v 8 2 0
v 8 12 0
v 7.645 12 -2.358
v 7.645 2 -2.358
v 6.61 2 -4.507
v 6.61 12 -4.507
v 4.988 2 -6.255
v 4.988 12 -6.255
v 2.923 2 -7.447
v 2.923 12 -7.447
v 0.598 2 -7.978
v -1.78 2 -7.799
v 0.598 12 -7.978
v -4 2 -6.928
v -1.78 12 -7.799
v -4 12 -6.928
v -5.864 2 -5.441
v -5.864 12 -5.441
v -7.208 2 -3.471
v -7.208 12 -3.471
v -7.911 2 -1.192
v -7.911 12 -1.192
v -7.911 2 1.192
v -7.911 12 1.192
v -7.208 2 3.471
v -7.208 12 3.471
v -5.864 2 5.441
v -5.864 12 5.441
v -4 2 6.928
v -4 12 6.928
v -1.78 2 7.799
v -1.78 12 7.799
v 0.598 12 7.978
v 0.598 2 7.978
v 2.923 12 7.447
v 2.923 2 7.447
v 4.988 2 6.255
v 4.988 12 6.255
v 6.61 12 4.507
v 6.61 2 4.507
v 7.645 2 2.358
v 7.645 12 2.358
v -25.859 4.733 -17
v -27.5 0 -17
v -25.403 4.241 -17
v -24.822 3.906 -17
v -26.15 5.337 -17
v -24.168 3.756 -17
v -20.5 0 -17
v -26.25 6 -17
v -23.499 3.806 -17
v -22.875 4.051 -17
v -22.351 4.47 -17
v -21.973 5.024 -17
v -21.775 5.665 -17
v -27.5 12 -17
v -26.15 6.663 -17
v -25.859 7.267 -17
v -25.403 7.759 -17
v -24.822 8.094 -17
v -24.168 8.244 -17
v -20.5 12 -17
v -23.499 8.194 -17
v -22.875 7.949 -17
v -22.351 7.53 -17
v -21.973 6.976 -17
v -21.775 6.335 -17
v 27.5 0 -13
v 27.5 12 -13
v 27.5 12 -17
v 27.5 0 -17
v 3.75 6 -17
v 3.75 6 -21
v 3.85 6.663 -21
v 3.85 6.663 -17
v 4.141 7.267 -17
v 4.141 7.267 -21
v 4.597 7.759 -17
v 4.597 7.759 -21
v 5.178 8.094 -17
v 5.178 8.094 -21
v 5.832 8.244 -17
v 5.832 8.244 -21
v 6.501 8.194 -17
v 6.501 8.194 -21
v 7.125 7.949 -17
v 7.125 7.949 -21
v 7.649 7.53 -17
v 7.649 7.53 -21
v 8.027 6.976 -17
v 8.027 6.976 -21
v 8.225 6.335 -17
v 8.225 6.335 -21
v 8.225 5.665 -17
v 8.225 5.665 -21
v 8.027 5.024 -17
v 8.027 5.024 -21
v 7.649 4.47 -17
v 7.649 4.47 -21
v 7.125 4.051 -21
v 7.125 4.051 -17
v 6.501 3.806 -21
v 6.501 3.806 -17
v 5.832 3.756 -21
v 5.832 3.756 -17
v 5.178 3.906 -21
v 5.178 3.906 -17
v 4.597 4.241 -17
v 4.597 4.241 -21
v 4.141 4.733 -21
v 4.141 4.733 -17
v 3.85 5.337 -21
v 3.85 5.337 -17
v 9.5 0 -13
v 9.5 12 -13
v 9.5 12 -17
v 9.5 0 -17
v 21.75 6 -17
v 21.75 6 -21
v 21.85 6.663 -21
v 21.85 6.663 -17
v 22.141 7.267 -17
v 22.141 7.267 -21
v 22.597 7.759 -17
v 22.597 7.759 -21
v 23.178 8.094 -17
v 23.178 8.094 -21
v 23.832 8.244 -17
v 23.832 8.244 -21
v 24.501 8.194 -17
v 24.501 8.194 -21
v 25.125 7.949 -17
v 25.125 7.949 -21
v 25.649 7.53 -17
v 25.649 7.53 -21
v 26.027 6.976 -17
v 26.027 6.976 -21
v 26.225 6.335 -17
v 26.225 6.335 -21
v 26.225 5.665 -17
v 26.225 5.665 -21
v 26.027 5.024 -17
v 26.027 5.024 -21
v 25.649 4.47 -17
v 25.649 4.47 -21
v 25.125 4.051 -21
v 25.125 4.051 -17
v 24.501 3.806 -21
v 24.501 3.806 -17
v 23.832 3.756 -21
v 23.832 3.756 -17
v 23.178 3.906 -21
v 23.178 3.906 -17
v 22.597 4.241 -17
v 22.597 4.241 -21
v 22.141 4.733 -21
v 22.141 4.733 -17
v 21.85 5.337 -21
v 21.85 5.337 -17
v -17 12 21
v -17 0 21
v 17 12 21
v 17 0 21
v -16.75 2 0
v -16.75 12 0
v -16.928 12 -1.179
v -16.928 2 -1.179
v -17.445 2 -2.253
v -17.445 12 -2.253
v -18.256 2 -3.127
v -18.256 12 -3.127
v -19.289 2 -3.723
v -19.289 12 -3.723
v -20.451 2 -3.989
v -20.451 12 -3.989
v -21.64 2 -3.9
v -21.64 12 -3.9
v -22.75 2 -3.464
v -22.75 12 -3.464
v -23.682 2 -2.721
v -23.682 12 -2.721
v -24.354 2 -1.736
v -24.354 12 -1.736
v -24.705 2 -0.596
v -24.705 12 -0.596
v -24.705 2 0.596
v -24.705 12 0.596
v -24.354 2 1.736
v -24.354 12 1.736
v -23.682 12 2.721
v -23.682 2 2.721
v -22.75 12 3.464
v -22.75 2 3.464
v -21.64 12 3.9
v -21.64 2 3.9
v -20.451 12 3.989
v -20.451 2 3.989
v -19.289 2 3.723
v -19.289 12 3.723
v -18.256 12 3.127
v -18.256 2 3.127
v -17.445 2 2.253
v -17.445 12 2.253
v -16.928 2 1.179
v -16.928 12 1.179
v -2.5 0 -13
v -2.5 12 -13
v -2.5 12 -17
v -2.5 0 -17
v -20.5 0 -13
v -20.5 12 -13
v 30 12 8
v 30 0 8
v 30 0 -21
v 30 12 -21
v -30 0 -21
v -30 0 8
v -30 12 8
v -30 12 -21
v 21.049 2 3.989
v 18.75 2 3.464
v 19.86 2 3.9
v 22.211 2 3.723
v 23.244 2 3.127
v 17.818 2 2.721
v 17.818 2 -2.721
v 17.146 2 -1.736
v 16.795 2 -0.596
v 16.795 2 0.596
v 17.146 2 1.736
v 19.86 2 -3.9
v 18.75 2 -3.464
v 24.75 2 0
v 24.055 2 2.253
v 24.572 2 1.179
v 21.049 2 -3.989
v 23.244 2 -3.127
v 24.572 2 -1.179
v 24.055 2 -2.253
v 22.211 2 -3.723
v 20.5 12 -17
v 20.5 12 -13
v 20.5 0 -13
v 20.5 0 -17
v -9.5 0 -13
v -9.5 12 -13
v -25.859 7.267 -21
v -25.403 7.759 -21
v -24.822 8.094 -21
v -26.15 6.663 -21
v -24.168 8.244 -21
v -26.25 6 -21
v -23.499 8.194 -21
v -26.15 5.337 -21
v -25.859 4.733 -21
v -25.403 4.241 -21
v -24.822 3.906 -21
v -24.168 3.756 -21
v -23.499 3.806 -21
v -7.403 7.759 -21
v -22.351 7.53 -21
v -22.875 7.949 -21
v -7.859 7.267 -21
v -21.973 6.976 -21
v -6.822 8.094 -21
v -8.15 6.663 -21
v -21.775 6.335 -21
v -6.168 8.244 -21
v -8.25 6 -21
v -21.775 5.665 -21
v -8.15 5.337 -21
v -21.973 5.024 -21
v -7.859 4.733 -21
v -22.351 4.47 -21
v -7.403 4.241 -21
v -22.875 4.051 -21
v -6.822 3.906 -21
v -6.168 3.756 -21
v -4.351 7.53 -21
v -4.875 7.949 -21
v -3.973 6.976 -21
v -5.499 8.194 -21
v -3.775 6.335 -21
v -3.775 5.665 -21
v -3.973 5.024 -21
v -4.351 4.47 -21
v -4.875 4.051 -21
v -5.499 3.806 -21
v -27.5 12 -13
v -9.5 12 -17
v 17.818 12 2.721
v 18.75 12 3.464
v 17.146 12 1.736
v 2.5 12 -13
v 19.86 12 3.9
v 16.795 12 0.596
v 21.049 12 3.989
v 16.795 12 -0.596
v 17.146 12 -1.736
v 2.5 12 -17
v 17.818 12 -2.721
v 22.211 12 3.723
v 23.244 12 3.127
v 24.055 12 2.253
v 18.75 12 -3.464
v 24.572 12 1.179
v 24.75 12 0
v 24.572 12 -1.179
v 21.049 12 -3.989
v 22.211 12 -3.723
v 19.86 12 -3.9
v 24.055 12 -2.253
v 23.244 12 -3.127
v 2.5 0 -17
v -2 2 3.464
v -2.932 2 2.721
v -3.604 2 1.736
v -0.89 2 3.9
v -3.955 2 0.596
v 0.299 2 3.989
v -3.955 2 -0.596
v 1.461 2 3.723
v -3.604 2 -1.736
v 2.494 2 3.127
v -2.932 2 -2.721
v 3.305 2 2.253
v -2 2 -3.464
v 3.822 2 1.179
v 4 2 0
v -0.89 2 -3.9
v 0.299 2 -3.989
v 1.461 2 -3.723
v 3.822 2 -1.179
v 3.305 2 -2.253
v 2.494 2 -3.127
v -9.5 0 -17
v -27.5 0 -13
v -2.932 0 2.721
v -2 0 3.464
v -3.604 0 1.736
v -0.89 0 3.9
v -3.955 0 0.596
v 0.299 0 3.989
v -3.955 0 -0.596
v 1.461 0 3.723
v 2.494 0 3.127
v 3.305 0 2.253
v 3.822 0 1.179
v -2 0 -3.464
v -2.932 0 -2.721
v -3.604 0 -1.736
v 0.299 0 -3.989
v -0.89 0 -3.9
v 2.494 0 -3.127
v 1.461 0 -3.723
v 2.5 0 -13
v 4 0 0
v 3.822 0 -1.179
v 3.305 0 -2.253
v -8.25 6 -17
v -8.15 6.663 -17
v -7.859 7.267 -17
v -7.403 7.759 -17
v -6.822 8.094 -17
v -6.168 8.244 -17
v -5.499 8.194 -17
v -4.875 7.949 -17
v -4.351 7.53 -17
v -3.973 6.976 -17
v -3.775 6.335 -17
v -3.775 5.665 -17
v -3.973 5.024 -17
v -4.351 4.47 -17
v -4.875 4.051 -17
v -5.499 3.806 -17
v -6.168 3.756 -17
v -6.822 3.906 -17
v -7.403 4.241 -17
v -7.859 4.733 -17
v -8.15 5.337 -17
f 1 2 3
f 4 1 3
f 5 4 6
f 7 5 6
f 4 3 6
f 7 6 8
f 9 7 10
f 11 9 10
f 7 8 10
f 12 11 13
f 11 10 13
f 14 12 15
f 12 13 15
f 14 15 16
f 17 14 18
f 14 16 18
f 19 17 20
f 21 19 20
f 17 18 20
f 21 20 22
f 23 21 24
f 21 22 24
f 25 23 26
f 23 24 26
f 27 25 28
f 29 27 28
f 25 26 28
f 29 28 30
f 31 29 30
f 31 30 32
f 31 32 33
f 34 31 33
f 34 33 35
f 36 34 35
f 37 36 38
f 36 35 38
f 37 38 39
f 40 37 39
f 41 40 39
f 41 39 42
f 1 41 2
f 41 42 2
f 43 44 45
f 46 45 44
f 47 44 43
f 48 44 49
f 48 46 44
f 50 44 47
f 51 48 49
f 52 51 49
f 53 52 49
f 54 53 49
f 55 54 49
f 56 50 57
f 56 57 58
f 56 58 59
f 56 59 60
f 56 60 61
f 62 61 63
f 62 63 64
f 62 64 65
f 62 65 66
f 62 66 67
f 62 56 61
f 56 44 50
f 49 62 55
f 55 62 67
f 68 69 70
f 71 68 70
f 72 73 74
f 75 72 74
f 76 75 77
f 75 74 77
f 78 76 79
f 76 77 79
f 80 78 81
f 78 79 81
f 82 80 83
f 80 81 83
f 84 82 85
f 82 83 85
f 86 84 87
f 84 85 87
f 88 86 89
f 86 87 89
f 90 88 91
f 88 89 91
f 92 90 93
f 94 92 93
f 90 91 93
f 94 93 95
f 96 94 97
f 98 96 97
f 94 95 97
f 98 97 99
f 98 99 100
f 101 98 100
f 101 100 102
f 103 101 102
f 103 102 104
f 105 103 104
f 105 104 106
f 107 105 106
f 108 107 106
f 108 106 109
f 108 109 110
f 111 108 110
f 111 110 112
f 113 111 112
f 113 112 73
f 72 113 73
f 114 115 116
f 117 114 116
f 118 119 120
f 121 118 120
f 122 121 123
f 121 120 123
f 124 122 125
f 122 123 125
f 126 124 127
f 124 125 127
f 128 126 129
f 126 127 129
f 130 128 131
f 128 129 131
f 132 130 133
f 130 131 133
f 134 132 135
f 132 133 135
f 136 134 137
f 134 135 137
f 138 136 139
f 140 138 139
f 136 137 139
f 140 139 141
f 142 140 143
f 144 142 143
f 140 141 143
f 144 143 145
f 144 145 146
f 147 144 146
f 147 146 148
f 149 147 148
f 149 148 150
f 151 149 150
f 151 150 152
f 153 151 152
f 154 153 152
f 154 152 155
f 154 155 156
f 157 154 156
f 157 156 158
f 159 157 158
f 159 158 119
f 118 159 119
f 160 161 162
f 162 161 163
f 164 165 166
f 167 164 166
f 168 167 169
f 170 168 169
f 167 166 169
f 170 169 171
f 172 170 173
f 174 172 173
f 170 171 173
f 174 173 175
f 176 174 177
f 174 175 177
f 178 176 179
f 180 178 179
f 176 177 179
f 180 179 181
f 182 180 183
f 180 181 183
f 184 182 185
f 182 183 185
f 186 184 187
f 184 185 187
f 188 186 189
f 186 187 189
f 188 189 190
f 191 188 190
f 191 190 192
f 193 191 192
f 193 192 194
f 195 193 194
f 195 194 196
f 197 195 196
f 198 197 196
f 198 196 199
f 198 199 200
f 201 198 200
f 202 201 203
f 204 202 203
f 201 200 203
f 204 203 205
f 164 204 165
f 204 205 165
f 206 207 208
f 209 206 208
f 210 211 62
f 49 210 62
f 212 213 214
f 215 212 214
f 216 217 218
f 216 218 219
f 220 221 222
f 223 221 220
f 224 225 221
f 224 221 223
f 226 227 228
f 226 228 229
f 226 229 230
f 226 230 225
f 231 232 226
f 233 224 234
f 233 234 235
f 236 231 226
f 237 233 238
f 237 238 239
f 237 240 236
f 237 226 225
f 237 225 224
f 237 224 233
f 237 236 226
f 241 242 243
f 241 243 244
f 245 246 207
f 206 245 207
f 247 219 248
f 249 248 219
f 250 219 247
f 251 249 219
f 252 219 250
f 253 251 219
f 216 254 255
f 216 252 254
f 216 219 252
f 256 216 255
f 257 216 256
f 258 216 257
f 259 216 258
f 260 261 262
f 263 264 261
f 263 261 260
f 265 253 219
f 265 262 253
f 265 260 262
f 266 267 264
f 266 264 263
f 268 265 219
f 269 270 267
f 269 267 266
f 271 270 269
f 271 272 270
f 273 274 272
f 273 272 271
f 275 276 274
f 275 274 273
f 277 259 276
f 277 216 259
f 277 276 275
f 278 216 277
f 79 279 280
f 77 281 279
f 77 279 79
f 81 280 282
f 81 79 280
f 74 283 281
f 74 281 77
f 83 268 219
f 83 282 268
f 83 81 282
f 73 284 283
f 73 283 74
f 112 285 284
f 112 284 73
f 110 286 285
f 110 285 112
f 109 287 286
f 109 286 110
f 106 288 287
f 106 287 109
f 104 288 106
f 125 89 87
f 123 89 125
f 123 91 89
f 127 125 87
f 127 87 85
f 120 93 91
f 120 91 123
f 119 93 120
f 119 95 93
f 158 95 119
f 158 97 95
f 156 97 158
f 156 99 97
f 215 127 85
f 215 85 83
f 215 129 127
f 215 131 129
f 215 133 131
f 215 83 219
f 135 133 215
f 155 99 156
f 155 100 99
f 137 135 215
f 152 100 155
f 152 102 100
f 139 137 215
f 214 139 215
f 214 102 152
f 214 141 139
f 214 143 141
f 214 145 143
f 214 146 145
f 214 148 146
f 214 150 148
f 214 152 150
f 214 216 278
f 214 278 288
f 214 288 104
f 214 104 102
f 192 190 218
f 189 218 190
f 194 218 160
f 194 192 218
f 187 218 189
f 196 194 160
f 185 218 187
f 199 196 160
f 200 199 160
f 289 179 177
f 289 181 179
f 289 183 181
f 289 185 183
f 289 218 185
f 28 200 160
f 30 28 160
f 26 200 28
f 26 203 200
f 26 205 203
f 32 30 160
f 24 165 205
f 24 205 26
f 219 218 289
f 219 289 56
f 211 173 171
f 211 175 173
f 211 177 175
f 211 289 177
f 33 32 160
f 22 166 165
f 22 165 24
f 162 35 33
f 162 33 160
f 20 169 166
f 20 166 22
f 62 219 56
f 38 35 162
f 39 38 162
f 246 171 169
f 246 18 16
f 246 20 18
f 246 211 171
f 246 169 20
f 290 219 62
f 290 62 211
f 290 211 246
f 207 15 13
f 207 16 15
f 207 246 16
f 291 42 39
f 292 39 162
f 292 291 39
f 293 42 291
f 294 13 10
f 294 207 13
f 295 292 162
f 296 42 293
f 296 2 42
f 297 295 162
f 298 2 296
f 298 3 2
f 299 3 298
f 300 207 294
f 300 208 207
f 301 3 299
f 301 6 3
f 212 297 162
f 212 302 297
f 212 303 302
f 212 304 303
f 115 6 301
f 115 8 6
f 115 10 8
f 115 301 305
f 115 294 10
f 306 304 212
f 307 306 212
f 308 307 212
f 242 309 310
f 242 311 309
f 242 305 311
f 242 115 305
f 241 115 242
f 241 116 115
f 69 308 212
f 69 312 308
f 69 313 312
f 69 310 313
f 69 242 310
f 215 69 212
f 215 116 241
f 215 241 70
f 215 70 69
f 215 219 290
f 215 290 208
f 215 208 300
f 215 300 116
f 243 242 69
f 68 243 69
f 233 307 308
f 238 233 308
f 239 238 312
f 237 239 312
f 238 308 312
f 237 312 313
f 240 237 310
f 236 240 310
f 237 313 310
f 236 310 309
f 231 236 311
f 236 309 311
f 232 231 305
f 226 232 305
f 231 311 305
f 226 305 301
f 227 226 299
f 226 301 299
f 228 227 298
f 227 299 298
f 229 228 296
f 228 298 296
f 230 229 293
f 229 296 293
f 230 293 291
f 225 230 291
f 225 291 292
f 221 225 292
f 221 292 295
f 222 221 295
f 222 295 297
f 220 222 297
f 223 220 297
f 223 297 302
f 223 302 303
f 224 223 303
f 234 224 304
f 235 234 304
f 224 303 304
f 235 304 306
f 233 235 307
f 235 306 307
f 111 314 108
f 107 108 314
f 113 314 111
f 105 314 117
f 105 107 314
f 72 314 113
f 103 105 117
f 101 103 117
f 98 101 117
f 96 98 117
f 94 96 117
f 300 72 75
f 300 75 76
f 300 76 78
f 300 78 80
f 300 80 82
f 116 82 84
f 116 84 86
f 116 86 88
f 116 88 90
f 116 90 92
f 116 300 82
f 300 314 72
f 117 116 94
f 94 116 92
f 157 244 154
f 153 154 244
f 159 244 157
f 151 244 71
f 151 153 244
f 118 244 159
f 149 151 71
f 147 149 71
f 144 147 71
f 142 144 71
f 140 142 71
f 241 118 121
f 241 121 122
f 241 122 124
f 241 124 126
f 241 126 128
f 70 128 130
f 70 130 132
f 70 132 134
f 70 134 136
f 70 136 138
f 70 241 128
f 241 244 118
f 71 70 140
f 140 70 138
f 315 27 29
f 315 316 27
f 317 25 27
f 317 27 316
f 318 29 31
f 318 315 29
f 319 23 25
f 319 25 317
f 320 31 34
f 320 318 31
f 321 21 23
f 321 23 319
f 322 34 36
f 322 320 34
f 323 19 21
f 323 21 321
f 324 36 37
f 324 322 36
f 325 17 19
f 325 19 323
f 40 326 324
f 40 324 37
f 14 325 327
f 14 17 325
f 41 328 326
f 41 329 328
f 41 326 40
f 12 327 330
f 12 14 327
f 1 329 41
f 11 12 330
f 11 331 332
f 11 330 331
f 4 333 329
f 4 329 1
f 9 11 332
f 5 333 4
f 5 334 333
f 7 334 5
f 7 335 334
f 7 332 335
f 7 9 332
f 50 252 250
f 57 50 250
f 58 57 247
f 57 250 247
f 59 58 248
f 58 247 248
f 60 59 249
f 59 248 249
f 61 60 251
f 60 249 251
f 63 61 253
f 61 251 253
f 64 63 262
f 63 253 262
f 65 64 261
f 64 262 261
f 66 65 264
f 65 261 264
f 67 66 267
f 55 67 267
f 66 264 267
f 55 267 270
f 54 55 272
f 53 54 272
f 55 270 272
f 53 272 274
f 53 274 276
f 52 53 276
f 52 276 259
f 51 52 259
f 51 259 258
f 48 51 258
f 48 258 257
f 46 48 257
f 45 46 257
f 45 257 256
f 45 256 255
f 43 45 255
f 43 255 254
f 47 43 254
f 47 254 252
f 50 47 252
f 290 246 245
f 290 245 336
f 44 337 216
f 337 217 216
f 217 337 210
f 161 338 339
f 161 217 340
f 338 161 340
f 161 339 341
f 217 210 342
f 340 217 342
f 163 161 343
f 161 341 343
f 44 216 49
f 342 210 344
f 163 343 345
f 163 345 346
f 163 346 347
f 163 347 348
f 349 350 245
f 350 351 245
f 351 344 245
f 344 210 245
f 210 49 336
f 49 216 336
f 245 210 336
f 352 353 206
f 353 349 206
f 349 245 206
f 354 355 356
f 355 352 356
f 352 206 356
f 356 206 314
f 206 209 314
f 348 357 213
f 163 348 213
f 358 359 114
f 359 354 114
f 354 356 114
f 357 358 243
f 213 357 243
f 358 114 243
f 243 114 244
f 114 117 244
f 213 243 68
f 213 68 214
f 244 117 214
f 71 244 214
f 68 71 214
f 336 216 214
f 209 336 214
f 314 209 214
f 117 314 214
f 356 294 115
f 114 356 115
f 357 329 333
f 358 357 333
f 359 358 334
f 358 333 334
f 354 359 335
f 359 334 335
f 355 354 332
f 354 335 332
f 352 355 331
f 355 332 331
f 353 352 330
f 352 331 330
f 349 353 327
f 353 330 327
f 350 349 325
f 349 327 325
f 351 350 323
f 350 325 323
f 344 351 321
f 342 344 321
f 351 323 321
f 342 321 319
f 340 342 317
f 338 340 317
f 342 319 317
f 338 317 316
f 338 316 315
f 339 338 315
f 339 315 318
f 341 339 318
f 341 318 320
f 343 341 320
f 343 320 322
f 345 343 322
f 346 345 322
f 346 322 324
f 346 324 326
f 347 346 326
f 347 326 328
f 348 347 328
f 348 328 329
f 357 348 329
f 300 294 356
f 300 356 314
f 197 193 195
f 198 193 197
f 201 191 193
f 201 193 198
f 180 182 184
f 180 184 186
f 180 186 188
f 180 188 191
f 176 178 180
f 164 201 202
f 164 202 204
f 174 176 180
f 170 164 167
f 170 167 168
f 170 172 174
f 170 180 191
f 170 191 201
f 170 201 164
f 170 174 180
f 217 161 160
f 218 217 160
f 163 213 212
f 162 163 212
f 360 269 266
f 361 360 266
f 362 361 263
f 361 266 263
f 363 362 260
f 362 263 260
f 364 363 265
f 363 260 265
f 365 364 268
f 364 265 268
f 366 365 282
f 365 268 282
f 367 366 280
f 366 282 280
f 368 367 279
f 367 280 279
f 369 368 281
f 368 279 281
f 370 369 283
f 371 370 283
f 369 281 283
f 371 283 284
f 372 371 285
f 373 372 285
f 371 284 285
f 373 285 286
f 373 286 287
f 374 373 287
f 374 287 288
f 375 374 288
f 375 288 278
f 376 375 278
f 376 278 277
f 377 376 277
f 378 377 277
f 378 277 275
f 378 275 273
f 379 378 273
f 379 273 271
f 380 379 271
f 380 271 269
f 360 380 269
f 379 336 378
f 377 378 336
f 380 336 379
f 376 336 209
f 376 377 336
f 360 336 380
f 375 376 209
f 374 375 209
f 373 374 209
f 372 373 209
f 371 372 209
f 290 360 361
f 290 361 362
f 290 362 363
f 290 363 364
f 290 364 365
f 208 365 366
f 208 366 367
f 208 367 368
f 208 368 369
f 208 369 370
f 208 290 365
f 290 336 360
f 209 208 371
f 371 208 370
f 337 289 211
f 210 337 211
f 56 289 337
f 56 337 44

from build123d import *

# Parameters (mm, degrees)
SKETCH1_W                      = 60
SKETCH1_H                      = 42
BOSS_EXTRUDE1_DEPTH            = 12
CUT_EXTRUDE1_REACH             = 14
SKETCH2_R                      = 4
CUT_EXTRUDE1_DIRECTION_2_DEPTH = 1
SKETCH3_R                      = 8
SKETCH3_R_2                    = 4
CUT_EXTRUDE2_DEPTH             = 1
CUT_EXTRUDE2_DEPTH_BACK        = 10
CHAMFER1_SIZE                  = 13
CUT_EXTRUDE4_REACH             = 14
SKETCH5_W                      = 7
SKETCH5_H                      = 4
CUT_EXTRUDE4_DIRECTION_2_DEPTH = 1
SKETCH4_R                      = 2.25
CUT_EXTRUDE3_DEPTH             = 7.5


with BuildPart() as part:
    # Sketch1 → Boss-Extrude1 (new body)
    with BuildSketch(Plane(origin=(0, 0, 0), x_dir=(1, 0, 0), z_dir=(0, 1, 0))):
        Rectangle(SKETCH1_W, SKETCH1_H)
    extrude(amount=BOSS_EXTRUDE1_DEPTH)

    # Sketch2 → Cut-Extrude1 (cut, up to next)
    with BuildSketch(Plane(origin=(0, 12, 0), x_dir=(1, 0, 0), z_dir=(0, 1, 0)), mode=Mode.PRIVATE) as cut_extrude1_sk1:
        Circle(SKETCH2_R)
    cut_extrude1_tool1 = extrude(cut_extrude1_sk1.sketch, amount=-CUT_EXTRUDE1_REACH, mode=Mode.PRIVATE) & part.part
    add(cut_extrude1_tool1.solids().sort_by_distance((0, 12, 0))[0], mode=Mode.SUBTRACT)

    # Sketch2 → Cut-Extrude1 direction 2 (cut)
    with BuildSketch(Plane(origin=(0, 12, 0), x_dir=(1, 0, 0), z_dir=(0, 1, 0))):
        Circle(SKETCH2_R)
    extrude(amount=CUT_EXTRUDE1_DIRECTION_2_DEPTH, mode=Mode.SUBTRACT)

    # Sketch3 → Cut-Extrude2 (cut, two sides)
    with BuildSketch(Plane(origin=(0, 12, 0), x_dir=(1, 0, 0), z_dir=(0, 1, 0))) as cut_extrude2_sk:
        Circle(SKETCH3_R)
        with Locations((20.75, 0)):
            Circle(SKETCH3_R_2)
        with Locations((-20.75, 0)):
            Circle(SKETCH3_R_2)
    extrude(amount=CUT_EXTRUDE2_DEPTH, mode=Mode.SUBTRACT)
    extrude(cut_extrude2_sk.sketch, amount=-CUT_EXTRUDE2_DEPTH_BACK, mode=Mode.SUBTRACT)

    # Chamfer1
    chamfer1_edges = [part.edges().sort_by_distance(p)[0] for p in [
        (30, 6, 21),
        (-30, 6, 21),
    ]]
    chamfer(chamfer1_edges, length=CHAMFER1_SIZE)

    # Sketch5 → Cut-Extrude4 (cut, up to next)
    with BuildSketch(Plane(origin=(0, 12, 0), x_dir=(1, 0, 0), z_dir=(0, 1, 0)), mode=Mode.PRIVATE) as cut_extrude4_sk1:
        with Locations((24, 15)):
            Rectangle(SKETCH5_W, SKETCH5_H)
    cut_extrude4_tool1 = extrude(cut_extrude4_sk1.sketch, amount=-CUT_EXTRUDE4_REACH, mode=Mode.PRIVATE) & part.part
    add(cut_extrude4_tool1.solids().sort_by_distance((24, 12, -15))[0], mode=Mode.SUBTRACT)
    # Sketch5 → Cut-Extrude4 (cut, up to next)
    with BuildSketch(Plane(origin=(0, 12, 0), x_dir=(1, 0, 0), z_dir=(0, 1, 0)), mode=Mode.PRIVATE) as cut_extrude4_sk2:
        with Locations((6, 15)):
            Rectangle(SKETCH5_W, SKETCH5_H)
    cut_extrude4_tool2 = extrude(cut_extrude4_sk2.sketch, amount=-CUT_EXTRUDE4_REACH, mode=Mode.PRIVATE) & part.part
    add(cut_extrude4_tool2.solids().sort_by_distance((6, 12, -15))[0], mode=Mode.SUBTRACT)
    # Sketch5 → Cut-Extrude4 (cut, up to next)
    with BuildSketch(Plane(origin=(0, 12, 0), x_dir=(1, 0, 0), z_dir=(0, 1, 0)), mode=Mode.PRIVATE) as cut_extrude4_sk3:
        with Locations((-6, 15)):
            Rectangle(SKETCH5_W, SKETCH5_H)
    cut_extrude4_tool3 = extrude(cut_extrude4_sk3.sketch, amount=-CUT_EXTRUDE4_REACH, mode=Mode.PRIVATE) & part.part
    add(cut_extrude4_tool3.solids().sort_by_distance((-6, 12, -15))[0], mode=Mode.SUBTRACT)
    # Sketch5 → Cut-Extrude4 (cut, up to next)
    with BuildSketch(Plane(origin=(0, 12, 0), x_dir=(1, 0, 0), z_dir=(0, 1, 0)), mode=Mode.PRIVATE) as cut_extrude4_sk4:
        with Locations((-24, 15)):
            Rectangle(SKETCH5_W, SKETCH5_H)
    cut_extrude4_tool4 = extrude(cut_extrude4_sk4.sketch, amount=-CUT_EXTRUDE4_REACH, mode=Mode.PRIVATE) & part.part
    add(cut_extrude4_tool4.solids().sort_by_distance((-24, 12, -15))[0], mode=Mode.SUBTRACT)

    # Sketch5 → Cut-Extrude4 direction 2 (cut)
    with BuildSketch(Plane(origin=(0, 12, 0), x_dir=(1, 0, 0), z_dir=(0, 1, 0))):
        with Locations((24, 15)):
            Rectangle(SKETCH5_W, SKETCH5_H)
        with Locations((6, 15)):
            Rectangle(SKETCH5_W, SKETCH5_H)
        with Locations((-6, 15)):
            Rectangle(SKETCH5_W, SKETCH5_H)
        with Locations((-24, 15)):
            Rectangle(SKETCH5_W, SKETCH5_H)
    extrude(amount=CUT_EXTRUDE4_DIRECTION_2_DEPTH, mode=Mode.SUBTRACT)

    # Sketch4 → Cut-Extrude3 (cut)
    with BuildSketch(Plane(origin=(0, 0, -21), x_dir=(-1, 0, 0), z_dir=(0, 0, -1))):
        with Locations((-24, 6)):
            Circle(SKETCH4_R)
        with Locations((-6, 6)):
            Circle(SKETCH4_R)
        with Locations((6, 6)):
            Circle(SKETCH4_R)
        with Locations((24, 6)):
            Circle(SKETCH4_R)
    extrude(amount=-CUT_EXTRUDE3_DEPTH, mode=Mode.SUBTRACT)


solid = part.part
